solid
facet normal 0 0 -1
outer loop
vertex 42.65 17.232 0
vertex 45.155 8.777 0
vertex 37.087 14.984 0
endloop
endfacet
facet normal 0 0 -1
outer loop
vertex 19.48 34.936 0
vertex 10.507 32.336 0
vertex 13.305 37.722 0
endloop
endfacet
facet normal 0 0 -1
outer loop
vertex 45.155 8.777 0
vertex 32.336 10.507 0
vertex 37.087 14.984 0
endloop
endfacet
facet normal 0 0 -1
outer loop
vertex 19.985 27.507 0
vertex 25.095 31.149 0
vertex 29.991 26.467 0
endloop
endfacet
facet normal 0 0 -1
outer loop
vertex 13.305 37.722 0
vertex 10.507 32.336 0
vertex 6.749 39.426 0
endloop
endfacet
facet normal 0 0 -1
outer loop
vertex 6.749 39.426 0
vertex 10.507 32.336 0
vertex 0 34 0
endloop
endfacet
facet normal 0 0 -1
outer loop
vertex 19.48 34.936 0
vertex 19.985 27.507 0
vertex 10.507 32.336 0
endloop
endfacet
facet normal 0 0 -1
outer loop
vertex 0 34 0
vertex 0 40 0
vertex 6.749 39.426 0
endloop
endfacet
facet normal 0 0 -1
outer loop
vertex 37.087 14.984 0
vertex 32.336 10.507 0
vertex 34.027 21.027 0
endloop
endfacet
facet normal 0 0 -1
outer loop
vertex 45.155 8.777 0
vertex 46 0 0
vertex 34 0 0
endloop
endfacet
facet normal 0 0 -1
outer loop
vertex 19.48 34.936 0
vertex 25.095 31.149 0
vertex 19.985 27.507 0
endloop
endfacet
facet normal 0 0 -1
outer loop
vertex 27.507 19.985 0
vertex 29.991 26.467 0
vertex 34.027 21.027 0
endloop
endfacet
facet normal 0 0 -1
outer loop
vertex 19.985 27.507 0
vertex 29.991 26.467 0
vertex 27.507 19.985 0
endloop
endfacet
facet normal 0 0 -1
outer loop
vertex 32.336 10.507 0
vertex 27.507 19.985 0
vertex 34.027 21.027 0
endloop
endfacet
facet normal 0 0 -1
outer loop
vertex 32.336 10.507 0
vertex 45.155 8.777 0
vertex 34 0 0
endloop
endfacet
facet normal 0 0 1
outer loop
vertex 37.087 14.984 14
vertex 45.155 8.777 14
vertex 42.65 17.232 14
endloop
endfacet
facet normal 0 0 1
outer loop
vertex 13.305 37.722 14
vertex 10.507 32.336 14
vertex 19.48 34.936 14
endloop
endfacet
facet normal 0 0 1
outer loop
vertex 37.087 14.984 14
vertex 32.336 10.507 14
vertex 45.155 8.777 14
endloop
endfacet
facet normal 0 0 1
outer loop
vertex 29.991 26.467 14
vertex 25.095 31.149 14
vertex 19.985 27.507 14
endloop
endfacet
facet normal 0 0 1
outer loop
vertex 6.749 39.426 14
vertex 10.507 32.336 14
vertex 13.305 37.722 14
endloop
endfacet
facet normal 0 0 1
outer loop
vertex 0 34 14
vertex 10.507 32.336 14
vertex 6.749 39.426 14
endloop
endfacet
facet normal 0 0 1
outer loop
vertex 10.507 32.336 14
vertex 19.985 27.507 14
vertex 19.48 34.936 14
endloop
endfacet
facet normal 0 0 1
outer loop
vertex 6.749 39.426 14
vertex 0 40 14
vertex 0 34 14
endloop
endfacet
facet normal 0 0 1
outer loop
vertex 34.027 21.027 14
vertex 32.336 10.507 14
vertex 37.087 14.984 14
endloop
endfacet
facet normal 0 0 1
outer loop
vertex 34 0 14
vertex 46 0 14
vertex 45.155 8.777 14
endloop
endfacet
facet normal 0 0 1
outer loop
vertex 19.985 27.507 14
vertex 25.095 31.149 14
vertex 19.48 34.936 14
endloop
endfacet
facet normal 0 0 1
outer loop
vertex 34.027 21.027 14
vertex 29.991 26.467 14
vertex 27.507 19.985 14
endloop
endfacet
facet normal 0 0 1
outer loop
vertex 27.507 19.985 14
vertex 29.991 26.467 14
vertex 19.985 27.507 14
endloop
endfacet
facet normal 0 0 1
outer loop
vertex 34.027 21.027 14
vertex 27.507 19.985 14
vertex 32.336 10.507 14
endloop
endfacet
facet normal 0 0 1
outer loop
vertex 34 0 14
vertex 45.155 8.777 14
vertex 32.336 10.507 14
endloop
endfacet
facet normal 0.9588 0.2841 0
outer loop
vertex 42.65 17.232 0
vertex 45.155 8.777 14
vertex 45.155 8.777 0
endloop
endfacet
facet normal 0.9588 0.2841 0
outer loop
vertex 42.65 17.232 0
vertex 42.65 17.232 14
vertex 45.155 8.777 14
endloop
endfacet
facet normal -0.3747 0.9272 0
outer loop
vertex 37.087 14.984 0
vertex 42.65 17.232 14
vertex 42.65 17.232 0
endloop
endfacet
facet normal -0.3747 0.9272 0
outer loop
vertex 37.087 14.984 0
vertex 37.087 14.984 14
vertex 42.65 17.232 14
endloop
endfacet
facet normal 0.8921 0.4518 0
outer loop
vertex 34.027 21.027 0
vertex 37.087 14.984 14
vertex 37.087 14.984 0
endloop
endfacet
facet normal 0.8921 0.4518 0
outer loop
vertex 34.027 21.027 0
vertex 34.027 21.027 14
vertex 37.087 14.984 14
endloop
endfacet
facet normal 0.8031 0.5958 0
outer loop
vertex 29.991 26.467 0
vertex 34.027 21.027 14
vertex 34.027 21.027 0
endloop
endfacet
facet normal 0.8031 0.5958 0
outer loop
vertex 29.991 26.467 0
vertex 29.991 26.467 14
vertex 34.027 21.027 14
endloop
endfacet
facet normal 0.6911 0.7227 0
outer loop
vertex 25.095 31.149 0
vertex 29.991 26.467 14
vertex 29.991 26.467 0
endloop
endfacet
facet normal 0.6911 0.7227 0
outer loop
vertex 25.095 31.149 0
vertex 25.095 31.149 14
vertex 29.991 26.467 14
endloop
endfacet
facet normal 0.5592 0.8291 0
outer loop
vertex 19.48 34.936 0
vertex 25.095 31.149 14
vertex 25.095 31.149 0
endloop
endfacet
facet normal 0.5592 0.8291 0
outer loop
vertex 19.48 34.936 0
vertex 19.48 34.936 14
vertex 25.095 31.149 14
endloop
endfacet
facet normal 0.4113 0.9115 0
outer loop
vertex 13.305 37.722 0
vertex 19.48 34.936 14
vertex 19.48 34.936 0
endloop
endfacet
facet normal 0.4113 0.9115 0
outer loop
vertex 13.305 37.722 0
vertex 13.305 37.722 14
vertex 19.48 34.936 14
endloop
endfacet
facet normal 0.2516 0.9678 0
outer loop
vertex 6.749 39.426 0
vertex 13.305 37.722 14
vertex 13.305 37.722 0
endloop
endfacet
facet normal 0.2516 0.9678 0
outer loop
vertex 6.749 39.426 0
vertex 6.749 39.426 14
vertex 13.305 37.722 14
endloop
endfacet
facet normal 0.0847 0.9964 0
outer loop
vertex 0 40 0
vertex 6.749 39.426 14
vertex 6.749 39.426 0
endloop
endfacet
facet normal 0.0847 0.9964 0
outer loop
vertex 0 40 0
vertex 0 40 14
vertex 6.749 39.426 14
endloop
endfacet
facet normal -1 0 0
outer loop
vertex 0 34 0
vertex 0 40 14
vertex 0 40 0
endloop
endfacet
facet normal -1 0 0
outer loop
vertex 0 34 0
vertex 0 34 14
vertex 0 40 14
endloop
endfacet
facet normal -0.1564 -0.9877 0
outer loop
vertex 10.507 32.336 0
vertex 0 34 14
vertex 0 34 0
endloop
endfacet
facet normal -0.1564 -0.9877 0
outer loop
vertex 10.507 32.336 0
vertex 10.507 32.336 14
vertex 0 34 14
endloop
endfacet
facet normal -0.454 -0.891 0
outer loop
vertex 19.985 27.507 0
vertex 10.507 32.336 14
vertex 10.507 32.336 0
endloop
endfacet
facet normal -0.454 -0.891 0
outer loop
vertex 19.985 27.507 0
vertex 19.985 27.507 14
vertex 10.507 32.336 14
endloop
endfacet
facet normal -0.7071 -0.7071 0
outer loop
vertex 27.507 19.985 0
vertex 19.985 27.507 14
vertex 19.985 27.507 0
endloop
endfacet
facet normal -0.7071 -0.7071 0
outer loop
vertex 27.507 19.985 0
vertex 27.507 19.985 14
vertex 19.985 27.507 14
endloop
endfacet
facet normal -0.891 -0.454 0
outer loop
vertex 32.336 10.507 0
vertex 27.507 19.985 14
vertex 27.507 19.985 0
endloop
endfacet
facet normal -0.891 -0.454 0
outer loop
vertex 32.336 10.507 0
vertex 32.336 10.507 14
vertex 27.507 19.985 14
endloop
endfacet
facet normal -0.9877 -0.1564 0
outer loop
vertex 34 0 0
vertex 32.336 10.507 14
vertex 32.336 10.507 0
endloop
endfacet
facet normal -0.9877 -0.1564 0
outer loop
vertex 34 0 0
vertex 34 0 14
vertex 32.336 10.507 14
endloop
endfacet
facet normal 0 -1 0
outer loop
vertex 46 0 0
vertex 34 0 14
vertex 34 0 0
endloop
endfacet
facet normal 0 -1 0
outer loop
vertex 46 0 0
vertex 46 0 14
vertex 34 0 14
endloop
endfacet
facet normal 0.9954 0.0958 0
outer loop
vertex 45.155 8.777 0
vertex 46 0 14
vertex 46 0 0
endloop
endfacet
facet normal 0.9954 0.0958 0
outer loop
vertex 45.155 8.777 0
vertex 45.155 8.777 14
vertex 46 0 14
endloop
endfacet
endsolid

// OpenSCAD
$fn = 32;

// ----------------------------------------------------------------------
// Arc stop: segment, 14 mm thick
// ----------------------------------------------------------------------

// --- parameters (mm) ---
profile_height = 14;      // extrusion height
profile_points = 17;      // points of the closed outline

profile = [[46, 0], [45.155, 8.777], [42.65, 17.232], [37.087, 14.984], [34.027, 21.027], [29.991, 26.467], [25.095, 31.149], [19.48, 34.936], [13.305, 37.722], [6.749, 39.426], [0, 40], [0, 34], [10.507, 32.336], [19.985, 27.507], [27.507, 19.985], [32.336, 10.507], [34, 0]];  // single closed polygon, 17 points, counter clockwise

// --- the one profile operation ---
linear_extrude(height = profile_height) polygon(points = profile);
